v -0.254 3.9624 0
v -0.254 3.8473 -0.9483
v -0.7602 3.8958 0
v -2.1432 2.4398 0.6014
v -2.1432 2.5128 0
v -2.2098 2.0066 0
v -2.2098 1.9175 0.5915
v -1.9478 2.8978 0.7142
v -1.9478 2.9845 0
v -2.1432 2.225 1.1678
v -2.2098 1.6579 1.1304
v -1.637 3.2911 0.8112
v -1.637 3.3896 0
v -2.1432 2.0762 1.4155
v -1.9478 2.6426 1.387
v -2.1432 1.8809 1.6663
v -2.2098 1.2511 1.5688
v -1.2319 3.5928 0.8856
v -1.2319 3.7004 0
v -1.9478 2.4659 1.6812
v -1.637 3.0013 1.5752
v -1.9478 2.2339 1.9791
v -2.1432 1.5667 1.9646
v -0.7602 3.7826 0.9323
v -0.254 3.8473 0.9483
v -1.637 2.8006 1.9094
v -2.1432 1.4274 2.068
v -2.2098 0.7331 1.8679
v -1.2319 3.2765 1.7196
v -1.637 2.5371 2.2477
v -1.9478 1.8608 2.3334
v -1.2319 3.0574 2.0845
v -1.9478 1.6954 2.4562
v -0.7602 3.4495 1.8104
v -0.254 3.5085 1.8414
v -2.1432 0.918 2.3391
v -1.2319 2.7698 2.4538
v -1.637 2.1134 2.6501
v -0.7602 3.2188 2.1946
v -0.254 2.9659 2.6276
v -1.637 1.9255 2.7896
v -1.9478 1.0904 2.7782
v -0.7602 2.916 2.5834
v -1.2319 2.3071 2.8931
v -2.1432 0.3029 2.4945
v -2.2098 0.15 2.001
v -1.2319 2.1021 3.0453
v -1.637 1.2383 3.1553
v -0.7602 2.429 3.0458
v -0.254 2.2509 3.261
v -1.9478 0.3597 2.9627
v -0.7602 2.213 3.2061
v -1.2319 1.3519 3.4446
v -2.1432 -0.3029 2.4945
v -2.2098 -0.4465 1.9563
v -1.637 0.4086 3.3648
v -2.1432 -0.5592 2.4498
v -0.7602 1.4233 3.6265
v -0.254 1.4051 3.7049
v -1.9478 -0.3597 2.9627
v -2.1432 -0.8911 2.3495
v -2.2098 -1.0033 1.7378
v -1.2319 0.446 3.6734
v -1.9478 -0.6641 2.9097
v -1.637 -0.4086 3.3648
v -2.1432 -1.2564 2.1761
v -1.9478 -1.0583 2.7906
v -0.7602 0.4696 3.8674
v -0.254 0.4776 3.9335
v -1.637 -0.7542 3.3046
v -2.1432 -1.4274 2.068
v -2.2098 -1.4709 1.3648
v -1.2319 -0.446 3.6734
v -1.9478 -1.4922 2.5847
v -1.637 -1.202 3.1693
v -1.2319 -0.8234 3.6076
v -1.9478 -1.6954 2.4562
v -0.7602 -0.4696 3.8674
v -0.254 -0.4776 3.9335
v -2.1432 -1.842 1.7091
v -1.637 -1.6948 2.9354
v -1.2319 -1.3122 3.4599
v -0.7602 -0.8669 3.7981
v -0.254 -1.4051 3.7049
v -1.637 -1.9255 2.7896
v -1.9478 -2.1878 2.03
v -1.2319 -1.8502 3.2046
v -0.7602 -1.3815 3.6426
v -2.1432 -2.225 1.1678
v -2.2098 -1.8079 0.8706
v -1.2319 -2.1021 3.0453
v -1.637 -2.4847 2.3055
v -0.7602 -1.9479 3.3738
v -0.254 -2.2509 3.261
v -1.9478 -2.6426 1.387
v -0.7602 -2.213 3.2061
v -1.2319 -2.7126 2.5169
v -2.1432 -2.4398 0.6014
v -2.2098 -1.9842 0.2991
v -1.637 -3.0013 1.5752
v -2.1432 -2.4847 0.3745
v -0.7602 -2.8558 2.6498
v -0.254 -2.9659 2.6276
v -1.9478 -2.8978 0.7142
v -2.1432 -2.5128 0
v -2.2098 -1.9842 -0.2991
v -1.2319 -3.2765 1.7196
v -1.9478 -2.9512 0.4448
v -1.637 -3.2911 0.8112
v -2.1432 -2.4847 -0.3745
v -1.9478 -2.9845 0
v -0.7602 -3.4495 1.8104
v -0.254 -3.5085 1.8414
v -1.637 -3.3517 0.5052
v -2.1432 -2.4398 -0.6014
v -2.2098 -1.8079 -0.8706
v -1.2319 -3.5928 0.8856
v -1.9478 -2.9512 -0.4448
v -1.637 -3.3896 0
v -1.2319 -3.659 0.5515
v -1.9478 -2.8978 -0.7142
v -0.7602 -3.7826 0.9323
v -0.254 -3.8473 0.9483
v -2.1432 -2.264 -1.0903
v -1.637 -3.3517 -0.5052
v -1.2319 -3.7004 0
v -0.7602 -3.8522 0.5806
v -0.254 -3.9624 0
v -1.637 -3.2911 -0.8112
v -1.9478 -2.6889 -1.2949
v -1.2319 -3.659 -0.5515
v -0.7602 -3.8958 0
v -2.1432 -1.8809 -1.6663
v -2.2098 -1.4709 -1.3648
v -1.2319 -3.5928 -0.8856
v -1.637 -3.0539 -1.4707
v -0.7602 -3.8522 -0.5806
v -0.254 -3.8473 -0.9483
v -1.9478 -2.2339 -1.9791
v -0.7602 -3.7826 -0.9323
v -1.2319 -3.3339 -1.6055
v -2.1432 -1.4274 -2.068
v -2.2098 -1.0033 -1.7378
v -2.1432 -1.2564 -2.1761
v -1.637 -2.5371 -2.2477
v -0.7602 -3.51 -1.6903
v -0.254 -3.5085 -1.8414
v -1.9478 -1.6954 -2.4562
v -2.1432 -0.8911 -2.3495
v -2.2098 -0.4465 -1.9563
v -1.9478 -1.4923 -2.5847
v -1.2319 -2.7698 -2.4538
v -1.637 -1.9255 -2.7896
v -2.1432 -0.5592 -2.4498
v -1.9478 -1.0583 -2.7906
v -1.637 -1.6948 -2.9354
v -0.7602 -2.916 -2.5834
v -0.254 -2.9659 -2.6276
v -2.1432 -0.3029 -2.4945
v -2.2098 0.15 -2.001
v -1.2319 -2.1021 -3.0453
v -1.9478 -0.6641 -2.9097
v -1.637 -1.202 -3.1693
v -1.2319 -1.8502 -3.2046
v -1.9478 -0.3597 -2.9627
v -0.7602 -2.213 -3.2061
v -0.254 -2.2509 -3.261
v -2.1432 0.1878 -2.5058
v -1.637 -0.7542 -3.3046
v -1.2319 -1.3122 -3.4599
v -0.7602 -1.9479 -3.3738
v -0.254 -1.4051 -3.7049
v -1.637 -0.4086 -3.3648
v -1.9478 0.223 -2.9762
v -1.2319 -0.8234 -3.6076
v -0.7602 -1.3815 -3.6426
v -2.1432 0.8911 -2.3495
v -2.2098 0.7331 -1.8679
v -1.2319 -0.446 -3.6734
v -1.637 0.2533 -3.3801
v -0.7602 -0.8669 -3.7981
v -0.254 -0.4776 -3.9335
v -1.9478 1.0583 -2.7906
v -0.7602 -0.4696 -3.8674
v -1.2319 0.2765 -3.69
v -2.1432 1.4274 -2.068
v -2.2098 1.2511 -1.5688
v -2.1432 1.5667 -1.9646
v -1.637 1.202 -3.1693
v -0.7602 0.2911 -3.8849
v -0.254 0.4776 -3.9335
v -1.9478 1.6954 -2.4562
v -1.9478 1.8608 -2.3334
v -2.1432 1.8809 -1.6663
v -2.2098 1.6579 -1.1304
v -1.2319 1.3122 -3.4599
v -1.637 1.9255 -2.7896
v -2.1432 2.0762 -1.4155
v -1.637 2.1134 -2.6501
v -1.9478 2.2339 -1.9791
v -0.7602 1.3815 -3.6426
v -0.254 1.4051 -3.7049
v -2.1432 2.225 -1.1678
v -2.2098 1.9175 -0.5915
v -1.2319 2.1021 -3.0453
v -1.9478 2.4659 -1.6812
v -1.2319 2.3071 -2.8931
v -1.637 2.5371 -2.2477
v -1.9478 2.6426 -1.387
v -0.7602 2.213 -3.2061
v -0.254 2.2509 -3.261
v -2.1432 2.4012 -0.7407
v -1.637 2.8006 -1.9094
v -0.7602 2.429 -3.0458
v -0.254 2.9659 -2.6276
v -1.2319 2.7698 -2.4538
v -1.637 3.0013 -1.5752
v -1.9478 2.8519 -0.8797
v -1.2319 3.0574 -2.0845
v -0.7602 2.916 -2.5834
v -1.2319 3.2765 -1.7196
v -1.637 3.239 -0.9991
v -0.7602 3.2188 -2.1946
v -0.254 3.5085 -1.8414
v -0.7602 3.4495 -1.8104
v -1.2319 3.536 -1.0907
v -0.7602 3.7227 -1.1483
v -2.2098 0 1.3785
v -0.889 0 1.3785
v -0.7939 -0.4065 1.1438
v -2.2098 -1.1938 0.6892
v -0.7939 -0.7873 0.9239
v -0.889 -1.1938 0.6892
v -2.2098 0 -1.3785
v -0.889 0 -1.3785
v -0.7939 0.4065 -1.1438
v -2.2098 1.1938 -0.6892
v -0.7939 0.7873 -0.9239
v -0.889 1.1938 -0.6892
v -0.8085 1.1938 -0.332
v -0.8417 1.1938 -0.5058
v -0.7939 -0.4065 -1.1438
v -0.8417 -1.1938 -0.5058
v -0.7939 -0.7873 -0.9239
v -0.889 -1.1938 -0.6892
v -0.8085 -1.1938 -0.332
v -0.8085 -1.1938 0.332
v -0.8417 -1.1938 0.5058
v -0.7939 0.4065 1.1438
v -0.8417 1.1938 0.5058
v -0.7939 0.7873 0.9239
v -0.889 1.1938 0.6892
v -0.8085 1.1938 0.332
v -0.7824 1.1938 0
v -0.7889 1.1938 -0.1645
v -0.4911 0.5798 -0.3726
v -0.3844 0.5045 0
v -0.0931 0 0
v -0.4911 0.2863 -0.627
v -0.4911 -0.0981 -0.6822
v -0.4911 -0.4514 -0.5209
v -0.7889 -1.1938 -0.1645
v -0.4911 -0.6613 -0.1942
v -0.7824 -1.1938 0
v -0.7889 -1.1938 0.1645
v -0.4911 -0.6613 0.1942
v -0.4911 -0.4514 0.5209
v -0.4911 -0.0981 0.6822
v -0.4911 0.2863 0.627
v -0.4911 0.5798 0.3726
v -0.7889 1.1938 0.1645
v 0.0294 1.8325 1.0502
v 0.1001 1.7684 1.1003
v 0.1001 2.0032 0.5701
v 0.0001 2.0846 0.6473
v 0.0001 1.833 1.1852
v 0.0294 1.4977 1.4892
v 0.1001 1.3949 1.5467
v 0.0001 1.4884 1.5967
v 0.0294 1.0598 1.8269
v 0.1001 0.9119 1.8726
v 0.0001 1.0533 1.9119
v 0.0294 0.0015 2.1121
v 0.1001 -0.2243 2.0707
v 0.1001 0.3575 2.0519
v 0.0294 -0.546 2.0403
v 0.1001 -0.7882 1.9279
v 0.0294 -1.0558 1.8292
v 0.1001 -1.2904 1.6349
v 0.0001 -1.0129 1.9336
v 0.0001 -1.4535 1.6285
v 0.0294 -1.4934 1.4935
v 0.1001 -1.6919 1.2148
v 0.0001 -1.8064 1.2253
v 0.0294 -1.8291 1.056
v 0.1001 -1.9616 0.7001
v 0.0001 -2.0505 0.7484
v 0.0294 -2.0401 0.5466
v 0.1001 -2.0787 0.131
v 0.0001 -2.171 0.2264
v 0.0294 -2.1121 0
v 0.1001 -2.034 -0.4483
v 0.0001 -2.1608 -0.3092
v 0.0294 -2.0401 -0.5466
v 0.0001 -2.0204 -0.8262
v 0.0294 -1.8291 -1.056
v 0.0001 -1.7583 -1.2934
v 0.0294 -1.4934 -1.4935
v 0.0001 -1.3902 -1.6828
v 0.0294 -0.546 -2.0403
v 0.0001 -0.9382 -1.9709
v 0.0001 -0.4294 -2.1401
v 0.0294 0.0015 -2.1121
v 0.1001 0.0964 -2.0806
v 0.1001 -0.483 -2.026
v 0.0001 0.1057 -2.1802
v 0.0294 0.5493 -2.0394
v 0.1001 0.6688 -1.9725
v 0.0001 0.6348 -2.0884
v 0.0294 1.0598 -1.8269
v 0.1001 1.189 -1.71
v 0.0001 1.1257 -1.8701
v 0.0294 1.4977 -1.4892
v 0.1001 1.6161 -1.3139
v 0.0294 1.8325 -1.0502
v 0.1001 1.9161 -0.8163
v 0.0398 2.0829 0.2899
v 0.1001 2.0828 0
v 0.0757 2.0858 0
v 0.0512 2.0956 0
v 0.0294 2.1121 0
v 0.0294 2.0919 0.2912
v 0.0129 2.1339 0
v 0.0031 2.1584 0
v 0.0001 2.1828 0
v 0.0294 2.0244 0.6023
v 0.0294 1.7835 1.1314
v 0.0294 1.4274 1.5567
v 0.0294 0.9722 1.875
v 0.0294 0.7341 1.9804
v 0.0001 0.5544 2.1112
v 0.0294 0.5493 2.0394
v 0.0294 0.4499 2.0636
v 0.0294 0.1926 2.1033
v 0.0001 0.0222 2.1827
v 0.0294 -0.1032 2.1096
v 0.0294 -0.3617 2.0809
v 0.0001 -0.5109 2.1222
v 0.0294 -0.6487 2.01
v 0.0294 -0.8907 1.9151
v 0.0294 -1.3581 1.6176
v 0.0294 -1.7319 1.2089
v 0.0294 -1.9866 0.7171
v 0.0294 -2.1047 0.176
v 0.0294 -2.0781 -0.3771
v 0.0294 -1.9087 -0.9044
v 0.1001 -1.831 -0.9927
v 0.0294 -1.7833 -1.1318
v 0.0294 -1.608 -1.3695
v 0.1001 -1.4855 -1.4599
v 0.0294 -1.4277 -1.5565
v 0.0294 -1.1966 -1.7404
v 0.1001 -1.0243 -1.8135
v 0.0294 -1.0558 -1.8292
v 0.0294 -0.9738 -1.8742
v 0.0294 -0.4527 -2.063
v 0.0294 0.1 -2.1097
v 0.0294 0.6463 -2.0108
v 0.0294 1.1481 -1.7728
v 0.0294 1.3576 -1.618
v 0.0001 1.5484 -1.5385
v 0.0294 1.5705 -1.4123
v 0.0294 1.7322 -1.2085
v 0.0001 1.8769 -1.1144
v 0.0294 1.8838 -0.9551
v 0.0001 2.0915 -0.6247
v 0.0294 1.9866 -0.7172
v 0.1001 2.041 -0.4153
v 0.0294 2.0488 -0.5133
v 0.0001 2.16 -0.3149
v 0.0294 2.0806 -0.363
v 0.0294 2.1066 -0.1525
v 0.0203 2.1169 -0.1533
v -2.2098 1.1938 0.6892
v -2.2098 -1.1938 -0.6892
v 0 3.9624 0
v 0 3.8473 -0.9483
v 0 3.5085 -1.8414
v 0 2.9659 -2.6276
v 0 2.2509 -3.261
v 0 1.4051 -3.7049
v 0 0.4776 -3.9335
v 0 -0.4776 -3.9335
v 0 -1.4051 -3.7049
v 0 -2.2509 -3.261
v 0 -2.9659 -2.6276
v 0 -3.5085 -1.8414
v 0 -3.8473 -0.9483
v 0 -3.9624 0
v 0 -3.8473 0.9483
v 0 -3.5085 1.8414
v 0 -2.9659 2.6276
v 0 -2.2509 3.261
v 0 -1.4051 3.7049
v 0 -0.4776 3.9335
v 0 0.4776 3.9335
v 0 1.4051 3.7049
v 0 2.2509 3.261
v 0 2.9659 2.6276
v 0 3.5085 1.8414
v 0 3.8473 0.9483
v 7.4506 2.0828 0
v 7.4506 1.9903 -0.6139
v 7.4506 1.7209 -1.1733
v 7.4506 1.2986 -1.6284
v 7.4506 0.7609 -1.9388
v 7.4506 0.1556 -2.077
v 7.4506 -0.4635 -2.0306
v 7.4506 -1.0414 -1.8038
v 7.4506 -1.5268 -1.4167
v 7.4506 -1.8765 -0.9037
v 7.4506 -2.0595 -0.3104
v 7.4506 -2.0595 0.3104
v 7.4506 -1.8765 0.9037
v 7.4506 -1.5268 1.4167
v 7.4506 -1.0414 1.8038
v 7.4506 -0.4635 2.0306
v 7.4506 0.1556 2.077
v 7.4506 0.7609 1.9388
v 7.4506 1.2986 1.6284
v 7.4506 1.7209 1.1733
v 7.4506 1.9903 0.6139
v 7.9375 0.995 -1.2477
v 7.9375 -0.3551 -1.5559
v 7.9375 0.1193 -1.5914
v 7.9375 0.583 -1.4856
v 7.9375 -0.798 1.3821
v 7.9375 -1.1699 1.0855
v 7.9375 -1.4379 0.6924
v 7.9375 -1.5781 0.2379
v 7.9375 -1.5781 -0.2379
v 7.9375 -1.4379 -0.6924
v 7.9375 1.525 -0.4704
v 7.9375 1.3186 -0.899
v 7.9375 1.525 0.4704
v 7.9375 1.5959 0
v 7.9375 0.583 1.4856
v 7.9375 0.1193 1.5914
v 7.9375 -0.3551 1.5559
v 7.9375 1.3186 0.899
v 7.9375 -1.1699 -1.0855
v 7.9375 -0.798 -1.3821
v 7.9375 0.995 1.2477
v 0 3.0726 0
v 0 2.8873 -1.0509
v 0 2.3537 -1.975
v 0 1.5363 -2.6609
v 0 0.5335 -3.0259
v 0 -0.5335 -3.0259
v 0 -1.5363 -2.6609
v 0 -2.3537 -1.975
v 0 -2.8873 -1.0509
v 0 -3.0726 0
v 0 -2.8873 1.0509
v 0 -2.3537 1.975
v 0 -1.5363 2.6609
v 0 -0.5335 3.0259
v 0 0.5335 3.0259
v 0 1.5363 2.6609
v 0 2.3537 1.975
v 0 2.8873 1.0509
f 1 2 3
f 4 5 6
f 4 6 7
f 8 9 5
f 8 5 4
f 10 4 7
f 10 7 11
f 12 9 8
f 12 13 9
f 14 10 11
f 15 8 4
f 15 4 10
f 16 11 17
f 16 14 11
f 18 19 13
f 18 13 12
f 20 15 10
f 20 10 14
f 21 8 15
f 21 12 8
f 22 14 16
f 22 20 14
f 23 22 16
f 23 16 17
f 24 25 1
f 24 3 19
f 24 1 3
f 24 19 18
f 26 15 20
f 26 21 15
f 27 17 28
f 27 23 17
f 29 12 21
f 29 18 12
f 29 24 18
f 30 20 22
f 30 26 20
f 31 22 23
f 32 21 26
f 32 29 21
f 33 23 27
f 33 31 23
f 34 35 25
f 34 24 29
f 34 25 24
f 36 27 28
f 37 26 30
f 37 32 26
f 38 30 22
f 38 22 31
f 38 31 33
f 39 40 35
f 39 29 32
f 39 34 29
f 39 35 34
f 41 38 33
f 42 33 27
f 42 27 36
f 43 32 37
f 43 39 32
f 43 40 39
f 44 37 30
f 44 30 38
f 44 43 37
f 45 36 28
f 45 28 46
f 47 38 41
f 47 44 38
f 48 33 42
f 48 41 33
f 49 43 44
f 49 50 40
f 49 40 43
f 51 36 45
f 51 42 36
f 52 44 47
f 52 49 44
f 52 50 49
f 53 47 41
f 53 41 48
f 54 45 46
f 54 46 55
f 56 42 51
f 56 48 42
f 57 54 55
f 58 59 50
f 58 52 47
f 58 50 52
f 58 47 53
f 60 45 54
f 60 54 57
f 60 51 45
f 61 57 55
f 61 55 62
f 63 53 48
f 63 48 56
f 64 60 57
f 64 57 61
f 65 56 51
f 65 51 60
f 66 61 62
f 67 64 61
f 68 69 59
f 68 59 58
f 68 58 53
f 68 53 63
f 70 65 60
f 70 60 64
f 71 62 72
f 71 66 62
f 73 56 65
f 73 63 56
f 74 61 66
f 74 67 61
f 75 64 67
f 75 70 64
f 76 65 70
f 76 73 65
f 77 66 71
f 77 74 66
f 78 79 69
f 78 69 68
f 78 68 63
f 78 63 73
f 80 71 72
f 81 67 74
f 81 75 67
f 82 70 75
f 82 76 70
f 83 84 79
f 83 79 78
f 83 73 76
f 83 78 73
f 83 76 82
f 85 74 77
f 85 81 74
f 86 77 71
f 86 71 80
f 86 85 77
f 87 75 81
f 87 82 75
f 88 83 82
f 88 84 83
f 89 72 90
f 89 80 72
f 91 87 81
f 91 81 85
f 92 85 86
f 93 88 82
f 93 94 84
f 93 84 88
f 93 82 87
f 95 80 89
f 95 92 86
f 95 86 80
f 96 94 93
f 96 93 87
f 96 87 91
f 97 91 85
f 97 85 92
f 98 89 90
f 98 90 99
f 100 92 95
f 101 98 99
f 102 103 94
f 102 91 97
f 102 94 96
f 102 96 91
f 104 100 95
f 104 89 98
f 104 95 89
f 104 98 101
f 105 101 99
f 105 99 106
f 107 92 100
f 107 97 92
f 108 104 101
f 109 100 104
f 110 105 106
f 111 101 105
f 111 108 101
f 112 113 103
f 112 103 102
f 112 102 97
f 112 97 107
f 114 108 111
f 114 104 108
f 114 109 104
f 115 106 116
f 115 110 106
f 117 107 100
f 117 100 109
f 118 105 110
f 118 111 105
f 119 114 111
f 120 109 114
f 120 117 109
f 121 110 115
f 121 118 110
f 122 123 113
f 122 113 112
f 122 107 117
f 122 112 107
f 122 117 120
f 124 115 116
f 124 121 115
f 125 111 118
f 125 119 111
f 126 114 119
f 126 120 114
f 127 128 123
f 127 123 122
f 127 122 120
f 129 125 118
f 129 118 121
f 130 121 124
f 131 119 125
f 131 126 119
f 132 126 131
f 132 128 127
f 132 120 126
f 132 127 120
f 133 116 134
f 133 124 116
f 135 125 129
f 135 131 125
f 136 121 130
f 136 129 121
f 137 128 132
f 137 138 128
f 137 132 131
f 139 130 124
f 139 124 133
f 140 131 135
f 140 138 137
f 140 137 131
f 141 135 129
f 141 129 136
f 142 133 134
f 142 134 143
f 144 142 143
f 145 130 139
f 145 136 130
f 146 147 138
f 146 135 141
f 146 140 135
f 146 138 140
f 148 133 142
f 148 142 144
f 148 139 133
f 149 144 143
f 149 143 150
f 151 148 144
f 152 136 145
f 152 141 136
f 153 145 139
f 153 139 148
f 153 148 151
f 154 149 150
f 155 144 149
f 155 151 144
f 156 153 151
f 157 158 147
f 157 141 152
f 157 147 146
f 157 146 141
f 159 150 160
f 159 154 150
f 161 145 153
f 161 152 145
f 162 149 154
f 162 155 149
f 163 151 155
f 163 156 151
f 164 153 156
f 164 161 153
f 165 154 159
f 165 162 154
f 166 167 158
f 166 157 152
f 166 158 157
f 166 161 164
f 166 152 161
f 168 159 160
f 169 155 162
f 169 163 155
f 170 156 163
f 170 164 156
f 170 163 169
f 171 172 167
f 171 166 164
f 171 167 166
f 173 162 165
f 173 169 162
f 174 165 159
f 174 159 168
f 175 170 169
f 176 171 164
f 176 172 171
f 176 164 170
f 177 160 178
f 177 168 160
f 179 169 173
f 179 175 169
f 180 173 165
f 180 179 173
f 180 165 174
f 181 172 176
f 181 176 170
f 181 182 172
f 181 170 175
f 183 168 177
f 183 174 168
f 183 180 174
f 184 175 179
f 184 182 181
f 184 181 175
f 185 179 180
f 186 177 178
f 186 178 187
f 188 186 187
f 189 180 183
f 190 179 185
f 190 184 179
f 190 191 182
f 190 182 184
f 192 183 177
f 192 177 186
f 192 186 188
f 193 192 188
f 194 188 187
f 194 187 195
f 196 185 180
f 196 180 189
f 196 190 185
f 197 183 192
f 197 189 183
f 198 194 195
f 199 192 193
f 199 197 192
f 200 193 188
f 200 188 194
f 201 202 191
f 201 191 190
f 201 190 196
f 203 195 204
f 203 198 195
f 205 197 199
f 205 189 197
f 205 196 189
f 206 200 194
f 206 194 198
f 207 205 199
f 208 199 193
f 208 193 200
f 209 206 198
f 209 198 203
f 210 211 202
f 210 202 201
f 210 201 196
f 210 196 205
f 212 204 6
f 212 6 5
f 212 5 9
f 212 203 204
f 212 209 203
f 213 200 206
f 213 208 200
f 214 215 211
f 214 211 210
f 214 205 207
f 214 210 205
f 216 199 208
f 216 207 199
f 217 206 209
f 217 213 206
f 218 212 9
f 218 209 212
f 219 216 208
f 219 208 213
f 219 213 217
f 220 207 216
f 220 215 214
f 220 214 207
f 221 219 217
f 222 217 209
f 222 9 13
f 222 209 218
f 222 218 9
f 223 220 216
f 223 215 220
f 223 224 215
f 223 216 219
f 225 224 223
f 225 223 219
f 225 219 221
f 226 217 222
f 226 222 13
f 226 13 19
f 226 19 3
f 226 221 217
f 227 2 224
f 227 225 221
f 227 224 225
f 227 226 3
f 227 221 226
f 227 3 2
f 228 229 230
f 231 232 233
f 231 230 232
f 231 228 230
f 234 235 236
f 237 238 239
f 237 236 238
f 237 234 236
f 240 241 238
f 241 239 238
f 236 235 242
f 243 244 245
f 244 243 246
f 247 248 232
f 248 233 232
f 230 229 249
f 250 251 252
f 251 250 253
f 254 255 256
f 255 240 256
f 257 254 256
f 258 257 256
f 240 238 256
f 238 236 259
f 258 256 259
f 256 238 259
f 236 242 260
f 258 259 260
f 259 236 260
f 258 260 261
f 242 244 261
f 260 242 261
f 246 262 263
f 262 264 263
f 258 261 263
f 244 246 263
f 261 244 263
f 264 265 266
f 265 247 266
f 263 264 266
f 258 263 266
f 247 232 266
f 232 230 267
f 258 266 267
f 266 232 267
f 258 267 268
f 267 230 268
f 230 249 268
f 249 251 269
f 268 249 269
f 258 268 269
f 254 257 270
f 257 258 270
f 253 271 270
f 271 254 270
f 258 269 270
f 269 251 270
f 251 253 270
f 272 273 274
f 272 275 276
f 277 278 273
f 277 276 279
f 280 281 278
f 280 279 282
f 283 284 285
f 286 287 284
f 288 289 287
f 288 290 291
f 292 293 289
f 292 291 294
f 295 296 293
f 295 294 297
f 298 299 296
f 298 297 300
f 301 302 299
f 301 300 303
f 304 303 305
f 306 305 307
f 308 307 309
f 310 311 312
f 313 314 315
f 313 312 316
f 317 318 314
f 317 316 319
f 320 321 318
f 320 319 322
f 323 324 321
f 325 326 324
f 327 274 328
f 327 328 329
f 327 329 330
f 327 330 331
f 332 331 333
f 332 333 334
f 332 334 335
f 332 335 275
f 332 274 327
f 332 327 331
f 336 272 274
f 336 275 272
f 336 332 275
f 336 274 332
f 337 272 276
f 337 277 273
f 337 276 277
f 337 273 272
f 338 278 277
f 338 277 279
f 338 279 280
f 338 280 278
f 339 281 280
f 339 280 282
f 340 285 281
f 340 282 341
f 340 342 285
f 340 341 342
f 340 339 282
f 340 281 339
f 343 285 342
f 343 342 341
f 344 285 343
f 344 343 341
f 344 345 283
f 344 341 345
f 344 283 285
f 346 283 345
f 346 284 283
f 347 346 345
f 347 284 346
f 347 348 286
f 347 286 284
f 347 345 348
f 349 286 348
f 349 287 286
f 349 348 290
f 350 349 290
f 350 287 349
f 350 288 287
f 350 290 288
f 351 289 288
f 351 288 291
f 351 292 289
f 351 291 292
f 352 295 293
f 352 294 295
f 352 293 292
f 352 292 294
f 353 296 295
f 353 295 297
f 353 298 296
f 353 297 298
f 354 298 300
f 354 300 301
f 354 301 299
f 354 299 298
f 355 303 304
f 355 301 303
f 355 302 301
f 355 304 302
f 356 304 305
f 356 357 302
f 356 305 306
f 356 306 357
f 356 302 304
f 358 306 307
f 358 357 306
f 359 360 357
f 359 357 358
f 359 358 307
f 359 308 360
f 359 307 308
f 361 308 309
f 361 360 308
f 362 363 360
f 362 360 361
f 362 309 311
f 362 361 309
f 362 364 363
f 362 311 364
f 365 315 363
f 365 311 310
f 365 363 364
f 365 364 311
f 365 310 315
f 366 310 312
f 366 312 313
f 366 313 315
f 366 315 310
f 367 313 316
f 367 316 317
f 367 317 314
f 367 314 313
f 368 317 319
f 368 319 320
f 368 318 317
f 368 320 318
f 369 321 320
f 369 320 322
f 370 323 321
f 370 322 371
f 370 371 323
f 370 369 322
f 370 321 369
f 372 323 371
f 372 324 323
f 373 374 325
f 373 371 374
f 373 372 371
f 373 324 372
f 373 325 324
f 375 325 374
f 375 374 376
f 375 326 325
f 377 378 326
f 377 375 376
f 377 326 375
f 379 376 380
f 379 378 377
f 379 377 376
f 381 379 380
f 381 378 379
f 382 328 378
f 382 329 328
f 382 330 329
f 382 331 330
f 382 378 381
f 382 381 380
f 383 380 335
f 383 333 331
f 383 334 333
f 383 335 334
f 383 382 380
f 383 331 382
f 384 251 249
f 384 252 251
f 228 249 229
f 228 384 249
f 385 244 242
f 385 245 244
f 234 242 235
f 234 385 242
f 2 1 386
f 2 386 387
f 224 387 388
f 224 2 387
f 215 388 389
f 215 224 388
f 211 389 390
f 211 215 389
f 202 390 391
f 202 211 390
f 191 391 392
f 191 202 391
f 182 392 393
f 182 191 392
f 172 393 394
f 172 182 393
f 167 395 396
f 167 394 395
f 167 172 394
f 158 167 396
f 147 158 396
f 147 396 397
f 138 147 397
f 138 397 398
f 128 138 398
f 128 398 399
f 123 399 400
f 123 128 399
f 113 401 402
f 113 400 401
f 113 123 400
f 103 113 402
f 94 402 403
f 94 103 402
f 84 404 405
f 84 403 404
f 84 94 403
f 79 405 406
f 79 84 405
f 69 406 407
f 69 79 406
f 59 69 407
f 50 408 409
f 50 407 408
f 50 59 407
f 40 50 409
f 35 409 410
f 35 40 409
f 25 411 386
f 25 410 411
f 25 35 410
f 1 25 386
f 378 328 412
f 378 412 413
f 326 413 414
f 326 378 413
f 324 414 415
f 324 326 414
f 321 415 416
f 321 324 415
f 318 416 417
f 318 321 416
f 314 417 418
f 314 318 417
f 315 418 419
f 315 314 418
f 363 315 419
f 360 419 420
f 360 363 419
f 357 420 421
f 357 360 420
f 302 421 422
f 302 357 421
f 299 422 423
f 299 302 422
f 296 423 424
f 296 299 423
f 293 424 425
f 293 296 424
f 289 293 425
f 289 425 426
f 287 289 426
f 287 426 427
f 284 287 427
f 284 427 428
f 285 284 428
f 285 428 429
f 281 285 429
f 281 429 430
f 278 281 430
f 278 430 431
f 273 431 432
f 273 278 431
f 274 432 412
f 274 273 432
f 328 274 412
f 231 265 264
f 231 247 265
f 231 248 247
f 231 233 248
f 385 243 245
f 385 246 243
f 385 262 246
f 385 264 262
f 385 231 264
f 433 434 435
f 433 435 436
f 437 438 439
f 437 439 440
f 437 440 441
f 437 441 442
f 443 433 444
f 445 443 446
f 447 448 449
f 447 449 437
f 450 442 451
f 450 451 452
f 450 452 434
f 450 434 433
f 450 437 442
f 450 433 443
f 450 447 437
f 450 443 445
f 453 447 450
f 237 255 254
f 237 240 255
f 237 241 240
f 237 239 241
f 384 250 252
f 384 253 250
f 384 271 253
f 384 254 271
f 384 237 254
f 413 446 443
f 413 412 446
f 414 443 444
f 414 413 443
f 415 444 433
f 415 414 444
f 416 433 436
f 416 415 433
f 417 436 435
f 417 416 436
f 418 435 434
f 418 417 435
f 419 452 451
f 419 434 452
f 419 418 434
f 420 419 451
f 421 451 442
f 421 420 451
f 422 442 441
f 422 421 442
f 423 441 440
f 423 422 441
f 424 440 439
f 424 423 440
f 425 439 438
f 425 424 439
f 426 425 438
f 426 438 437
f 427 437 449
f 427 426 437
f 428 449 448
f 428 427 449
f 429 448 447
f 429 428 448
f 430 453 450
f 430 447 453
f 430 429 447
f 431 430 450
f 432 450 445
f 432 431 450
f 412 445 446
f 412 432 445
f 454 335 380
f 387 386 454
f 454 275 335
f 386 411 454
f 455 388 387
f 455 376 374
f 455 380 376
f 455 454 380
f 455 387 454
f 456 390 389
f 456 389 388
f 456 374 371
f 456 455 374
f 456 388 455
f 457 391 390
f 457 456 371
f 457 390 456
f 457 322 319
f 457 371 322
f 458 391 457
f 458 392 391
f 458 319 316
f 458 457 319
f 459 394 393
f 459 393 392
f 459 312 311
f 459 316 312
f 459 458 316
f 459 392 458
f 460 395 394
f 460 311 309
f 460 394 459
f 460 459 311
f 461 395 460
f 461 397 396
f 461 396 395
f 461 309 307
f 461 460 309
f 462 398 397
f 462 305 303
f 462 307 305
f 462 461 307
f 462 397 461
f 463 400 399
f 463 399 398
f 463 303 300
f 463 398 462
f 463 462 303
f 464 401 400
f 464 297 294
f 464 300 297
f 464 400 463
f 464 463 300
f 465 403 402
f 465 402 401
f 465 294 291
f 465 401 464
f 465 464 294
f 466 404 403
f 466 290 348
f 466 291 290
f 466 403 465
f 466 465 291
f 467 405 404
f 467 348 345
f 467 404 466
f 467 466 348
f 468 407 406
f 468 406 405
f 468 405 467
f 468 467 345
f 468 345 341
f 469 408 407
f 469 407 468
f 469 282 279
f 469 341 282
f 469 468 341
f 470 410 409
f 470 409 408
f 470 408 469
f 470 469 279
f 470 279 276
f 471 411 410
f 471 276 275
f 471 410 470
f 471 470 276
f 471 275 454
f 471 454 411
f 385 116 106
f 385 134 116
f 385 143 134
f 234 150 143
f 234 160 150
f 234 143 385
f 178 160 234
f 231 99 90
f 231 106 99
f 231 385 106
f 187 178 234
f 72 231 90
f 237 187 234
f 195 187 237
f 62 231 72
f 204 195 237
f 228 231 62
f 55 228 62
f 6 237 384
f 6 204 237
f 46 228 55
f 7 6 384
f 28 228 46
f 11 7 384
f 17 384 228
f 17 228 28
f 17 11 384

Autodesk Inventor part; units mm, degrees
ref_plane "YZ Plane" through (0, 0, 0) normal (1, 0, 0) x (0, 1, 0)
ref_plane "XZ Plane" through (0, 0, 0) normal (0, 1, 0) x (-1, 0, 0)
sketch "Sketch1" plane through (0, 0, 0) normal (0, 0, 1) x (1, 0, 0)
  line L0 (-0.0931, 0) -> (7.9375, 0)
  line L1 (7.9375, 0) -> (7.9375, 2.0828)
  line L2 (7.9375, 2.0828) -> (1.5902, 2.0828)
  line L3 (1.5902, 2.0828) -> (0.0001, 2.0828)
  line L4 (0.0001, 2.0828) -> (0, 2.0828)
  line L5 (0, 2.0828) -> (0, 3.9624)
  line L6 (0, 3.9624) -> (-2.2098, 3.9624)
  line L7 (-2.2098, 3.9624) -> (-2.2098, 1.3785)
  line L8 (-2.2098, 1.3785) -> (-0.889, 1.3785)
  line L9 (-0.889, 1.3785) -> (-0.0931, 0)
  line L10 (-4.2393, 0) -> (9.967, 0) projected
  line L11 (0, -0.7925) -> (0, 4.7549) projected
  line L12 (1.5902, 2.0828) -> (0, 2.0828) construction
  dimension "d1" = 6.3473
  dimension "d2" = 1.5901
  dimension "d3" = 2.2098
  dimension "d4" = 1.3208
  dimension "d5" = 60
  dimension "d6" = 4.1656
  dimension "d7" = 4.1656
  dimension "d8" = 2.757
  dimension "d9" = 7.9248
  dimension "d26" = 7.9375
revolve "Body" add sketch "Sketch1" angle 360 about axis through (-0.0931, 0, 0) along (1, 0, 0)
sketch "Sketch2" plane through (-2.2098, 0, 0) normal (-1, 0, 0) x (0, 0, 1)
  circle A0 centre (0, 0) radius 1.3785 projected
  line L0 (0, -5.5474) -> (0, 5.5474) projected
  line L1 (-5.5474, 0) -> (5.5474, 0) projected
  line L2 (1.3785, 0) -> (0.6892, -1.1938)
  line L3 (0.6892, -1.1938) -> (-0.6892, -1.1938)
  line L4 (-0.6892, -1.1938) -> (-1.3785, 0)
  line L5 (-1.3785, 0) -> (-0.6892, 1.1938)
  line L6 (-0.6892, 1.1938) -> (0.6892, 1.1938)
  line L7 (0.6892, 1.1938) -> (1.3785, 0)
extrude "Slot" add sketch "Sketch2" against normal up to next contours L7 A0 | A0 L2 | L6 L0 A0 | A0 L0 L3 | L0 L6 A0 | A0 L3 L0 | L4 A0 | A0 L5
fillet "Fillet1" radius 1.9558 1 edges at (-2.2098, -3.9624, 0)
thread "Thread" size "8-32 UNC" class "2A" standard "ANSI Unified Screw Threads" length 6.3473
chamfer "Chamfer1" distance 0.4869 distance2 0.4869 1 edges at (7.9375, -2.0828, 0) measured on face at (7.9375, -0.0837, 0.6892)
ref_plane "Work Plane1" through (29, 0, 0) normal (0, -1, 0) x (1, 0, 0)
fillet "Fillet2" radius 0.1 1 edges at (0.0001, -2.0828, 0)
equation "\"d30\" = R"
equation "\"d17\" = RR"
equation "\"d13\" = GEL"
equation "\"d15\" = -0.5 * SPD + 0.5 * GD"
equation "\"d16\" = GUL"
equation "\"d1\" = GEL"
equation "\"d3\" = KOH"
equation "\"d4\" = INTI"
equation "\"d6\" = GD"
equation "\"d7\" = BDM"
equation "\"d8\" = 1.1547 * SW"
equation "\"d9\" = KOD"
equation "\"d26\" = NLG"
equation "\"GD\" = NND"
equation "\"NLG\" = 7.9375"
equation "\"GEL\" = 6.34726"
equation "\"KOD\" = 7.9248"
equation "\"KOH\" = 2.2098"
equation "\"INTI\" = 1.3208"
equation "\"GAL\" = 1.59004"
equation "\"GUL\" = 0.48692"
equation "\"BDM\" = NND"
equation "\"SW\" = 2.3876"
equation "\"RR\" = 1.9558"
equation "\"SPD\" = 3.19176"
equation "\"R\" = 0.1"
equation "\"TOA\" = 30deg"
equation "\"GD1\" = SPD"
equation "\"THREADDIA\" = 4.1656"
equation "\"KOH1\" = 0.381"
equation "\"NND\" = 4.1656"
equation "\"E0\" = 2.75768"
properties part number "ANSI B18.3 - 8 - 32 x 5/16" material "Steel, Mild"
